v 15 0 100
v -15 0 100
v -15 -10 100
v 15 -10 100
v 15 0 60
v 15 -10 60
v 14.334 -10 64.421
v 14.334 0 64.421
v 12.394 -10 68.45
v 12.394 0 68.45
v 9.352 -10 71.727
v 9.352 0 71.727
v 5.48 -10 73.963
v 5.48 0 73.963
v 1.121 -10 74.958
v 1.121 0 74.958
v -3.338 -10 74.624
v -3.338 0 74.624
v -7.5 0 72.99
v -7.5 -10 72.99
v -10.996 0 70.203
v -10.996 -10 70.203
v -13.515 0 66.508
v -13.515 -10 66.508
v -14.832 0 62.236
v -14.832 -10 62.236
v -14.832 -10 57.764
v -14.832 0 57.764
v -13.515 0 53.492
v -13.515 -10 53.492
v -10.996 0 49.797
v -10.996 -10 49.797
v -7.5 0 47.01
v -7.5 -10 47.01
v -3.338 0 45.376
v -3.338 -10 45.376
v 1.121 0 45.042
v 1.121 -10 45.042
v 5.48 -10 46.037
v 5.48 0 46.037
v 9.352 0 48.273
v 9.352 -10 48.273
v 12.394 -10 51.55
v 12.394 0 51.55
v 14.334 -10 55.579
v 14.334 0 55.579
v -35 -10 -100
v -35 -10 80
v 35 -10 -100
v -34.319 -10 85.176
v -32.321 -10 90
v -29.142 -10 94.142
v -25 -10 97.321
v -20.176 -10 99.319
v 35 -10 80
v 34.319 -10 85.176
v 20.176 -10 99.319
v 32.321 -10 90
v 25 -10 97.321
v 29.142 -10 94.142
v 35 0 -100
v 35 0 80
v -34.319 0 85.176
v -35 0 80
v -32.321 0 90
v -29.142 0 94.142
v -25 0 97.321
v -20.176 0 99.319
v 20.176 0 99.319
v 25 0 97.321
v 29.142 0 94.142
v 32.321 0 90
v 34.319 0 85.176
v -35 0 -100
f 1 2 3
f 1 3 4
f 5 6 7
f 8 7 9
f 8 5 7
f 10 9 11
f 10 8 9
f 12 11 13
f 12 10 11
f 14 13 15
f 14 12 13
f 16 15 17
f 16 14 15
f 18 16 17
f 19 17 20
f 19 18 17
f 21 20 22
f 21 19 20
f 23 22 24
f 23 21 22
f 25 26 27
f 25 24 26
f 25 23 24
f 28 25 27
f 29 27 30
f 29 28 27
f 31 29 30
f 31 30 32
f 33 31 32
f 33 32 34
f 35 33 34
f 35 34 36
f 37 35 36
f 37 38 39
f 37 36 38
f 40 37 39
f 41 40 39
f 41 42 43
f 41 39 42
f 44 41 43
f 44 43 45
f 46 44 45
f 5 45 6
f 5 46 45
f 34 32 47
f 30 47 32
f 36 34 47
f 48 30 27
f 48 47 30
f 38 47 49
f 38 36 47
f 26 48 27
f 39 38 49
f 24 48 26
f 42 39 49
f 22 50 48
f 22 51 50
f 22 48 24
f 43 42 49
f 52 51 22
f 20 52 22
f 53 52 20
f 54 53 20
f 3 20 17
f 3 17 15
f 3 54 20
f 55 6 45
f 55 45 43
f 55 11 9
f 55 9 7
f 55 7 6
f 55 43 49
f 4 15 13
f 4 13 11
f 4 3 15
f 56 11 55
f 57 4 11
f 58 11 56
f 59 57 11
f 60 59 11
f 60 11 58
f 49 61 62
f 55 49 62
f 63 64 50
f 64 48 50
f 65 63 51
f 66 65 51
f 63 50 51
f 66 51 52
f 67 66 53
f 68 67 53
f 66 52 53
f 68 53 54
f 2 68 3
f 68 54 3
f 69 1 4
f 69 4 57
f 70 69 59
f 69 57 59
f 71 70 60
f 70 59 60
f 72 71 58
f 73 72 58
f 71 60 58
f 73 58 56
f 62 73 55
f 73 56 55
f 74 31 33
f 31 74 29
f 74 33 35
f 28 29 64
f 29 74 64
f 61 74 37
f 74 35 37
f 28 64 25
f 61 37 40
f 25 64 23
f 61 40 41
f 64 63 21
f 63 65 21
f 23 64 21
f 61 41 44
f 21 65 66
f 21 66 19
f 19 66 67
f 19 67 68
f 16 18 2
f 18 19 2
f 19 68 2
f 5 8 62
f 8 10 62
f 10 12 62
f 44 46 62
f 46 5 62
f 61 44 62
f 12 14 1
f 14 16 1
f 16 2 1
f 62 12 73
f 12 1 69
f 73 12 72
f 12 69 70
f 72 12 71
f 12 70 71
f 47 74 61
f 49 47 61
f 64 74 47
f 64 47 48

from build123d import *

# Parameters (mm, degrees)
F0_W          = 70
F0_H          = 200
F1_DEPTH      = 10
F2_R          = 15
F3_DEPTH      = 218
F3_DEPTH_BACK = 25
F4_R          = 20


# Not quite as in the source:
# - an extrude ends at something that could not be found from the text; its depth is read off the source's solid


with BuildPart() as f1:
    # F0 (on Front) → F1 (new body)
    with BuildSketch(Plane.XZ):
        Rectangle(F0_W, F0_H)
    extrude(amount=F1_DEPTH)

    # F2 (on Front) → F3 (cut, two sides)
    with BuildSketch(Plane.XZ) as f3_sk:
        with Locations((0, 60)):
            Circle(F2_R)
    extrude(amount=-F3_DEPTH, mode=Mode.SUBTRACT)
    extrude(f3_sk.sketch, amount=F3_DEPTH_BACK, mode=Mode.SUBTRACT)

    # F4
    f4_edges = [f1.edges().sort_by_distance(p)[0] for p in [
        (-35, -5, 100),
        (35, -5, 100),
    ]]
    fillet(f4_edges, radius=F4_R)


solid = f1.part
